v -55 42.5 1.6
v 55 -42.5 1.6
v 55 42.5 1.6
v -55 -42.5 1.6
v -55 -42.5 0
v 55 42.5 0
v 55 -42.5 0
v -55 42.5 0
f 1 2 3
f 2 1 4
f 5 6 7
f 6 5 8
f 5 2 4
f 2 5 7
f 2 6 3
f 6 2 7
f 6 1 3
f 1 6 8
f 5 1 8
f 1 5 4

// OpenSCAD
$fn=64;

module mainboard(length=110.0, width=85.0, thickness=1.6) {
    translate([0,0,thickness/2])
        cube([length, width, thickness], center=true);
}

mainboard();
